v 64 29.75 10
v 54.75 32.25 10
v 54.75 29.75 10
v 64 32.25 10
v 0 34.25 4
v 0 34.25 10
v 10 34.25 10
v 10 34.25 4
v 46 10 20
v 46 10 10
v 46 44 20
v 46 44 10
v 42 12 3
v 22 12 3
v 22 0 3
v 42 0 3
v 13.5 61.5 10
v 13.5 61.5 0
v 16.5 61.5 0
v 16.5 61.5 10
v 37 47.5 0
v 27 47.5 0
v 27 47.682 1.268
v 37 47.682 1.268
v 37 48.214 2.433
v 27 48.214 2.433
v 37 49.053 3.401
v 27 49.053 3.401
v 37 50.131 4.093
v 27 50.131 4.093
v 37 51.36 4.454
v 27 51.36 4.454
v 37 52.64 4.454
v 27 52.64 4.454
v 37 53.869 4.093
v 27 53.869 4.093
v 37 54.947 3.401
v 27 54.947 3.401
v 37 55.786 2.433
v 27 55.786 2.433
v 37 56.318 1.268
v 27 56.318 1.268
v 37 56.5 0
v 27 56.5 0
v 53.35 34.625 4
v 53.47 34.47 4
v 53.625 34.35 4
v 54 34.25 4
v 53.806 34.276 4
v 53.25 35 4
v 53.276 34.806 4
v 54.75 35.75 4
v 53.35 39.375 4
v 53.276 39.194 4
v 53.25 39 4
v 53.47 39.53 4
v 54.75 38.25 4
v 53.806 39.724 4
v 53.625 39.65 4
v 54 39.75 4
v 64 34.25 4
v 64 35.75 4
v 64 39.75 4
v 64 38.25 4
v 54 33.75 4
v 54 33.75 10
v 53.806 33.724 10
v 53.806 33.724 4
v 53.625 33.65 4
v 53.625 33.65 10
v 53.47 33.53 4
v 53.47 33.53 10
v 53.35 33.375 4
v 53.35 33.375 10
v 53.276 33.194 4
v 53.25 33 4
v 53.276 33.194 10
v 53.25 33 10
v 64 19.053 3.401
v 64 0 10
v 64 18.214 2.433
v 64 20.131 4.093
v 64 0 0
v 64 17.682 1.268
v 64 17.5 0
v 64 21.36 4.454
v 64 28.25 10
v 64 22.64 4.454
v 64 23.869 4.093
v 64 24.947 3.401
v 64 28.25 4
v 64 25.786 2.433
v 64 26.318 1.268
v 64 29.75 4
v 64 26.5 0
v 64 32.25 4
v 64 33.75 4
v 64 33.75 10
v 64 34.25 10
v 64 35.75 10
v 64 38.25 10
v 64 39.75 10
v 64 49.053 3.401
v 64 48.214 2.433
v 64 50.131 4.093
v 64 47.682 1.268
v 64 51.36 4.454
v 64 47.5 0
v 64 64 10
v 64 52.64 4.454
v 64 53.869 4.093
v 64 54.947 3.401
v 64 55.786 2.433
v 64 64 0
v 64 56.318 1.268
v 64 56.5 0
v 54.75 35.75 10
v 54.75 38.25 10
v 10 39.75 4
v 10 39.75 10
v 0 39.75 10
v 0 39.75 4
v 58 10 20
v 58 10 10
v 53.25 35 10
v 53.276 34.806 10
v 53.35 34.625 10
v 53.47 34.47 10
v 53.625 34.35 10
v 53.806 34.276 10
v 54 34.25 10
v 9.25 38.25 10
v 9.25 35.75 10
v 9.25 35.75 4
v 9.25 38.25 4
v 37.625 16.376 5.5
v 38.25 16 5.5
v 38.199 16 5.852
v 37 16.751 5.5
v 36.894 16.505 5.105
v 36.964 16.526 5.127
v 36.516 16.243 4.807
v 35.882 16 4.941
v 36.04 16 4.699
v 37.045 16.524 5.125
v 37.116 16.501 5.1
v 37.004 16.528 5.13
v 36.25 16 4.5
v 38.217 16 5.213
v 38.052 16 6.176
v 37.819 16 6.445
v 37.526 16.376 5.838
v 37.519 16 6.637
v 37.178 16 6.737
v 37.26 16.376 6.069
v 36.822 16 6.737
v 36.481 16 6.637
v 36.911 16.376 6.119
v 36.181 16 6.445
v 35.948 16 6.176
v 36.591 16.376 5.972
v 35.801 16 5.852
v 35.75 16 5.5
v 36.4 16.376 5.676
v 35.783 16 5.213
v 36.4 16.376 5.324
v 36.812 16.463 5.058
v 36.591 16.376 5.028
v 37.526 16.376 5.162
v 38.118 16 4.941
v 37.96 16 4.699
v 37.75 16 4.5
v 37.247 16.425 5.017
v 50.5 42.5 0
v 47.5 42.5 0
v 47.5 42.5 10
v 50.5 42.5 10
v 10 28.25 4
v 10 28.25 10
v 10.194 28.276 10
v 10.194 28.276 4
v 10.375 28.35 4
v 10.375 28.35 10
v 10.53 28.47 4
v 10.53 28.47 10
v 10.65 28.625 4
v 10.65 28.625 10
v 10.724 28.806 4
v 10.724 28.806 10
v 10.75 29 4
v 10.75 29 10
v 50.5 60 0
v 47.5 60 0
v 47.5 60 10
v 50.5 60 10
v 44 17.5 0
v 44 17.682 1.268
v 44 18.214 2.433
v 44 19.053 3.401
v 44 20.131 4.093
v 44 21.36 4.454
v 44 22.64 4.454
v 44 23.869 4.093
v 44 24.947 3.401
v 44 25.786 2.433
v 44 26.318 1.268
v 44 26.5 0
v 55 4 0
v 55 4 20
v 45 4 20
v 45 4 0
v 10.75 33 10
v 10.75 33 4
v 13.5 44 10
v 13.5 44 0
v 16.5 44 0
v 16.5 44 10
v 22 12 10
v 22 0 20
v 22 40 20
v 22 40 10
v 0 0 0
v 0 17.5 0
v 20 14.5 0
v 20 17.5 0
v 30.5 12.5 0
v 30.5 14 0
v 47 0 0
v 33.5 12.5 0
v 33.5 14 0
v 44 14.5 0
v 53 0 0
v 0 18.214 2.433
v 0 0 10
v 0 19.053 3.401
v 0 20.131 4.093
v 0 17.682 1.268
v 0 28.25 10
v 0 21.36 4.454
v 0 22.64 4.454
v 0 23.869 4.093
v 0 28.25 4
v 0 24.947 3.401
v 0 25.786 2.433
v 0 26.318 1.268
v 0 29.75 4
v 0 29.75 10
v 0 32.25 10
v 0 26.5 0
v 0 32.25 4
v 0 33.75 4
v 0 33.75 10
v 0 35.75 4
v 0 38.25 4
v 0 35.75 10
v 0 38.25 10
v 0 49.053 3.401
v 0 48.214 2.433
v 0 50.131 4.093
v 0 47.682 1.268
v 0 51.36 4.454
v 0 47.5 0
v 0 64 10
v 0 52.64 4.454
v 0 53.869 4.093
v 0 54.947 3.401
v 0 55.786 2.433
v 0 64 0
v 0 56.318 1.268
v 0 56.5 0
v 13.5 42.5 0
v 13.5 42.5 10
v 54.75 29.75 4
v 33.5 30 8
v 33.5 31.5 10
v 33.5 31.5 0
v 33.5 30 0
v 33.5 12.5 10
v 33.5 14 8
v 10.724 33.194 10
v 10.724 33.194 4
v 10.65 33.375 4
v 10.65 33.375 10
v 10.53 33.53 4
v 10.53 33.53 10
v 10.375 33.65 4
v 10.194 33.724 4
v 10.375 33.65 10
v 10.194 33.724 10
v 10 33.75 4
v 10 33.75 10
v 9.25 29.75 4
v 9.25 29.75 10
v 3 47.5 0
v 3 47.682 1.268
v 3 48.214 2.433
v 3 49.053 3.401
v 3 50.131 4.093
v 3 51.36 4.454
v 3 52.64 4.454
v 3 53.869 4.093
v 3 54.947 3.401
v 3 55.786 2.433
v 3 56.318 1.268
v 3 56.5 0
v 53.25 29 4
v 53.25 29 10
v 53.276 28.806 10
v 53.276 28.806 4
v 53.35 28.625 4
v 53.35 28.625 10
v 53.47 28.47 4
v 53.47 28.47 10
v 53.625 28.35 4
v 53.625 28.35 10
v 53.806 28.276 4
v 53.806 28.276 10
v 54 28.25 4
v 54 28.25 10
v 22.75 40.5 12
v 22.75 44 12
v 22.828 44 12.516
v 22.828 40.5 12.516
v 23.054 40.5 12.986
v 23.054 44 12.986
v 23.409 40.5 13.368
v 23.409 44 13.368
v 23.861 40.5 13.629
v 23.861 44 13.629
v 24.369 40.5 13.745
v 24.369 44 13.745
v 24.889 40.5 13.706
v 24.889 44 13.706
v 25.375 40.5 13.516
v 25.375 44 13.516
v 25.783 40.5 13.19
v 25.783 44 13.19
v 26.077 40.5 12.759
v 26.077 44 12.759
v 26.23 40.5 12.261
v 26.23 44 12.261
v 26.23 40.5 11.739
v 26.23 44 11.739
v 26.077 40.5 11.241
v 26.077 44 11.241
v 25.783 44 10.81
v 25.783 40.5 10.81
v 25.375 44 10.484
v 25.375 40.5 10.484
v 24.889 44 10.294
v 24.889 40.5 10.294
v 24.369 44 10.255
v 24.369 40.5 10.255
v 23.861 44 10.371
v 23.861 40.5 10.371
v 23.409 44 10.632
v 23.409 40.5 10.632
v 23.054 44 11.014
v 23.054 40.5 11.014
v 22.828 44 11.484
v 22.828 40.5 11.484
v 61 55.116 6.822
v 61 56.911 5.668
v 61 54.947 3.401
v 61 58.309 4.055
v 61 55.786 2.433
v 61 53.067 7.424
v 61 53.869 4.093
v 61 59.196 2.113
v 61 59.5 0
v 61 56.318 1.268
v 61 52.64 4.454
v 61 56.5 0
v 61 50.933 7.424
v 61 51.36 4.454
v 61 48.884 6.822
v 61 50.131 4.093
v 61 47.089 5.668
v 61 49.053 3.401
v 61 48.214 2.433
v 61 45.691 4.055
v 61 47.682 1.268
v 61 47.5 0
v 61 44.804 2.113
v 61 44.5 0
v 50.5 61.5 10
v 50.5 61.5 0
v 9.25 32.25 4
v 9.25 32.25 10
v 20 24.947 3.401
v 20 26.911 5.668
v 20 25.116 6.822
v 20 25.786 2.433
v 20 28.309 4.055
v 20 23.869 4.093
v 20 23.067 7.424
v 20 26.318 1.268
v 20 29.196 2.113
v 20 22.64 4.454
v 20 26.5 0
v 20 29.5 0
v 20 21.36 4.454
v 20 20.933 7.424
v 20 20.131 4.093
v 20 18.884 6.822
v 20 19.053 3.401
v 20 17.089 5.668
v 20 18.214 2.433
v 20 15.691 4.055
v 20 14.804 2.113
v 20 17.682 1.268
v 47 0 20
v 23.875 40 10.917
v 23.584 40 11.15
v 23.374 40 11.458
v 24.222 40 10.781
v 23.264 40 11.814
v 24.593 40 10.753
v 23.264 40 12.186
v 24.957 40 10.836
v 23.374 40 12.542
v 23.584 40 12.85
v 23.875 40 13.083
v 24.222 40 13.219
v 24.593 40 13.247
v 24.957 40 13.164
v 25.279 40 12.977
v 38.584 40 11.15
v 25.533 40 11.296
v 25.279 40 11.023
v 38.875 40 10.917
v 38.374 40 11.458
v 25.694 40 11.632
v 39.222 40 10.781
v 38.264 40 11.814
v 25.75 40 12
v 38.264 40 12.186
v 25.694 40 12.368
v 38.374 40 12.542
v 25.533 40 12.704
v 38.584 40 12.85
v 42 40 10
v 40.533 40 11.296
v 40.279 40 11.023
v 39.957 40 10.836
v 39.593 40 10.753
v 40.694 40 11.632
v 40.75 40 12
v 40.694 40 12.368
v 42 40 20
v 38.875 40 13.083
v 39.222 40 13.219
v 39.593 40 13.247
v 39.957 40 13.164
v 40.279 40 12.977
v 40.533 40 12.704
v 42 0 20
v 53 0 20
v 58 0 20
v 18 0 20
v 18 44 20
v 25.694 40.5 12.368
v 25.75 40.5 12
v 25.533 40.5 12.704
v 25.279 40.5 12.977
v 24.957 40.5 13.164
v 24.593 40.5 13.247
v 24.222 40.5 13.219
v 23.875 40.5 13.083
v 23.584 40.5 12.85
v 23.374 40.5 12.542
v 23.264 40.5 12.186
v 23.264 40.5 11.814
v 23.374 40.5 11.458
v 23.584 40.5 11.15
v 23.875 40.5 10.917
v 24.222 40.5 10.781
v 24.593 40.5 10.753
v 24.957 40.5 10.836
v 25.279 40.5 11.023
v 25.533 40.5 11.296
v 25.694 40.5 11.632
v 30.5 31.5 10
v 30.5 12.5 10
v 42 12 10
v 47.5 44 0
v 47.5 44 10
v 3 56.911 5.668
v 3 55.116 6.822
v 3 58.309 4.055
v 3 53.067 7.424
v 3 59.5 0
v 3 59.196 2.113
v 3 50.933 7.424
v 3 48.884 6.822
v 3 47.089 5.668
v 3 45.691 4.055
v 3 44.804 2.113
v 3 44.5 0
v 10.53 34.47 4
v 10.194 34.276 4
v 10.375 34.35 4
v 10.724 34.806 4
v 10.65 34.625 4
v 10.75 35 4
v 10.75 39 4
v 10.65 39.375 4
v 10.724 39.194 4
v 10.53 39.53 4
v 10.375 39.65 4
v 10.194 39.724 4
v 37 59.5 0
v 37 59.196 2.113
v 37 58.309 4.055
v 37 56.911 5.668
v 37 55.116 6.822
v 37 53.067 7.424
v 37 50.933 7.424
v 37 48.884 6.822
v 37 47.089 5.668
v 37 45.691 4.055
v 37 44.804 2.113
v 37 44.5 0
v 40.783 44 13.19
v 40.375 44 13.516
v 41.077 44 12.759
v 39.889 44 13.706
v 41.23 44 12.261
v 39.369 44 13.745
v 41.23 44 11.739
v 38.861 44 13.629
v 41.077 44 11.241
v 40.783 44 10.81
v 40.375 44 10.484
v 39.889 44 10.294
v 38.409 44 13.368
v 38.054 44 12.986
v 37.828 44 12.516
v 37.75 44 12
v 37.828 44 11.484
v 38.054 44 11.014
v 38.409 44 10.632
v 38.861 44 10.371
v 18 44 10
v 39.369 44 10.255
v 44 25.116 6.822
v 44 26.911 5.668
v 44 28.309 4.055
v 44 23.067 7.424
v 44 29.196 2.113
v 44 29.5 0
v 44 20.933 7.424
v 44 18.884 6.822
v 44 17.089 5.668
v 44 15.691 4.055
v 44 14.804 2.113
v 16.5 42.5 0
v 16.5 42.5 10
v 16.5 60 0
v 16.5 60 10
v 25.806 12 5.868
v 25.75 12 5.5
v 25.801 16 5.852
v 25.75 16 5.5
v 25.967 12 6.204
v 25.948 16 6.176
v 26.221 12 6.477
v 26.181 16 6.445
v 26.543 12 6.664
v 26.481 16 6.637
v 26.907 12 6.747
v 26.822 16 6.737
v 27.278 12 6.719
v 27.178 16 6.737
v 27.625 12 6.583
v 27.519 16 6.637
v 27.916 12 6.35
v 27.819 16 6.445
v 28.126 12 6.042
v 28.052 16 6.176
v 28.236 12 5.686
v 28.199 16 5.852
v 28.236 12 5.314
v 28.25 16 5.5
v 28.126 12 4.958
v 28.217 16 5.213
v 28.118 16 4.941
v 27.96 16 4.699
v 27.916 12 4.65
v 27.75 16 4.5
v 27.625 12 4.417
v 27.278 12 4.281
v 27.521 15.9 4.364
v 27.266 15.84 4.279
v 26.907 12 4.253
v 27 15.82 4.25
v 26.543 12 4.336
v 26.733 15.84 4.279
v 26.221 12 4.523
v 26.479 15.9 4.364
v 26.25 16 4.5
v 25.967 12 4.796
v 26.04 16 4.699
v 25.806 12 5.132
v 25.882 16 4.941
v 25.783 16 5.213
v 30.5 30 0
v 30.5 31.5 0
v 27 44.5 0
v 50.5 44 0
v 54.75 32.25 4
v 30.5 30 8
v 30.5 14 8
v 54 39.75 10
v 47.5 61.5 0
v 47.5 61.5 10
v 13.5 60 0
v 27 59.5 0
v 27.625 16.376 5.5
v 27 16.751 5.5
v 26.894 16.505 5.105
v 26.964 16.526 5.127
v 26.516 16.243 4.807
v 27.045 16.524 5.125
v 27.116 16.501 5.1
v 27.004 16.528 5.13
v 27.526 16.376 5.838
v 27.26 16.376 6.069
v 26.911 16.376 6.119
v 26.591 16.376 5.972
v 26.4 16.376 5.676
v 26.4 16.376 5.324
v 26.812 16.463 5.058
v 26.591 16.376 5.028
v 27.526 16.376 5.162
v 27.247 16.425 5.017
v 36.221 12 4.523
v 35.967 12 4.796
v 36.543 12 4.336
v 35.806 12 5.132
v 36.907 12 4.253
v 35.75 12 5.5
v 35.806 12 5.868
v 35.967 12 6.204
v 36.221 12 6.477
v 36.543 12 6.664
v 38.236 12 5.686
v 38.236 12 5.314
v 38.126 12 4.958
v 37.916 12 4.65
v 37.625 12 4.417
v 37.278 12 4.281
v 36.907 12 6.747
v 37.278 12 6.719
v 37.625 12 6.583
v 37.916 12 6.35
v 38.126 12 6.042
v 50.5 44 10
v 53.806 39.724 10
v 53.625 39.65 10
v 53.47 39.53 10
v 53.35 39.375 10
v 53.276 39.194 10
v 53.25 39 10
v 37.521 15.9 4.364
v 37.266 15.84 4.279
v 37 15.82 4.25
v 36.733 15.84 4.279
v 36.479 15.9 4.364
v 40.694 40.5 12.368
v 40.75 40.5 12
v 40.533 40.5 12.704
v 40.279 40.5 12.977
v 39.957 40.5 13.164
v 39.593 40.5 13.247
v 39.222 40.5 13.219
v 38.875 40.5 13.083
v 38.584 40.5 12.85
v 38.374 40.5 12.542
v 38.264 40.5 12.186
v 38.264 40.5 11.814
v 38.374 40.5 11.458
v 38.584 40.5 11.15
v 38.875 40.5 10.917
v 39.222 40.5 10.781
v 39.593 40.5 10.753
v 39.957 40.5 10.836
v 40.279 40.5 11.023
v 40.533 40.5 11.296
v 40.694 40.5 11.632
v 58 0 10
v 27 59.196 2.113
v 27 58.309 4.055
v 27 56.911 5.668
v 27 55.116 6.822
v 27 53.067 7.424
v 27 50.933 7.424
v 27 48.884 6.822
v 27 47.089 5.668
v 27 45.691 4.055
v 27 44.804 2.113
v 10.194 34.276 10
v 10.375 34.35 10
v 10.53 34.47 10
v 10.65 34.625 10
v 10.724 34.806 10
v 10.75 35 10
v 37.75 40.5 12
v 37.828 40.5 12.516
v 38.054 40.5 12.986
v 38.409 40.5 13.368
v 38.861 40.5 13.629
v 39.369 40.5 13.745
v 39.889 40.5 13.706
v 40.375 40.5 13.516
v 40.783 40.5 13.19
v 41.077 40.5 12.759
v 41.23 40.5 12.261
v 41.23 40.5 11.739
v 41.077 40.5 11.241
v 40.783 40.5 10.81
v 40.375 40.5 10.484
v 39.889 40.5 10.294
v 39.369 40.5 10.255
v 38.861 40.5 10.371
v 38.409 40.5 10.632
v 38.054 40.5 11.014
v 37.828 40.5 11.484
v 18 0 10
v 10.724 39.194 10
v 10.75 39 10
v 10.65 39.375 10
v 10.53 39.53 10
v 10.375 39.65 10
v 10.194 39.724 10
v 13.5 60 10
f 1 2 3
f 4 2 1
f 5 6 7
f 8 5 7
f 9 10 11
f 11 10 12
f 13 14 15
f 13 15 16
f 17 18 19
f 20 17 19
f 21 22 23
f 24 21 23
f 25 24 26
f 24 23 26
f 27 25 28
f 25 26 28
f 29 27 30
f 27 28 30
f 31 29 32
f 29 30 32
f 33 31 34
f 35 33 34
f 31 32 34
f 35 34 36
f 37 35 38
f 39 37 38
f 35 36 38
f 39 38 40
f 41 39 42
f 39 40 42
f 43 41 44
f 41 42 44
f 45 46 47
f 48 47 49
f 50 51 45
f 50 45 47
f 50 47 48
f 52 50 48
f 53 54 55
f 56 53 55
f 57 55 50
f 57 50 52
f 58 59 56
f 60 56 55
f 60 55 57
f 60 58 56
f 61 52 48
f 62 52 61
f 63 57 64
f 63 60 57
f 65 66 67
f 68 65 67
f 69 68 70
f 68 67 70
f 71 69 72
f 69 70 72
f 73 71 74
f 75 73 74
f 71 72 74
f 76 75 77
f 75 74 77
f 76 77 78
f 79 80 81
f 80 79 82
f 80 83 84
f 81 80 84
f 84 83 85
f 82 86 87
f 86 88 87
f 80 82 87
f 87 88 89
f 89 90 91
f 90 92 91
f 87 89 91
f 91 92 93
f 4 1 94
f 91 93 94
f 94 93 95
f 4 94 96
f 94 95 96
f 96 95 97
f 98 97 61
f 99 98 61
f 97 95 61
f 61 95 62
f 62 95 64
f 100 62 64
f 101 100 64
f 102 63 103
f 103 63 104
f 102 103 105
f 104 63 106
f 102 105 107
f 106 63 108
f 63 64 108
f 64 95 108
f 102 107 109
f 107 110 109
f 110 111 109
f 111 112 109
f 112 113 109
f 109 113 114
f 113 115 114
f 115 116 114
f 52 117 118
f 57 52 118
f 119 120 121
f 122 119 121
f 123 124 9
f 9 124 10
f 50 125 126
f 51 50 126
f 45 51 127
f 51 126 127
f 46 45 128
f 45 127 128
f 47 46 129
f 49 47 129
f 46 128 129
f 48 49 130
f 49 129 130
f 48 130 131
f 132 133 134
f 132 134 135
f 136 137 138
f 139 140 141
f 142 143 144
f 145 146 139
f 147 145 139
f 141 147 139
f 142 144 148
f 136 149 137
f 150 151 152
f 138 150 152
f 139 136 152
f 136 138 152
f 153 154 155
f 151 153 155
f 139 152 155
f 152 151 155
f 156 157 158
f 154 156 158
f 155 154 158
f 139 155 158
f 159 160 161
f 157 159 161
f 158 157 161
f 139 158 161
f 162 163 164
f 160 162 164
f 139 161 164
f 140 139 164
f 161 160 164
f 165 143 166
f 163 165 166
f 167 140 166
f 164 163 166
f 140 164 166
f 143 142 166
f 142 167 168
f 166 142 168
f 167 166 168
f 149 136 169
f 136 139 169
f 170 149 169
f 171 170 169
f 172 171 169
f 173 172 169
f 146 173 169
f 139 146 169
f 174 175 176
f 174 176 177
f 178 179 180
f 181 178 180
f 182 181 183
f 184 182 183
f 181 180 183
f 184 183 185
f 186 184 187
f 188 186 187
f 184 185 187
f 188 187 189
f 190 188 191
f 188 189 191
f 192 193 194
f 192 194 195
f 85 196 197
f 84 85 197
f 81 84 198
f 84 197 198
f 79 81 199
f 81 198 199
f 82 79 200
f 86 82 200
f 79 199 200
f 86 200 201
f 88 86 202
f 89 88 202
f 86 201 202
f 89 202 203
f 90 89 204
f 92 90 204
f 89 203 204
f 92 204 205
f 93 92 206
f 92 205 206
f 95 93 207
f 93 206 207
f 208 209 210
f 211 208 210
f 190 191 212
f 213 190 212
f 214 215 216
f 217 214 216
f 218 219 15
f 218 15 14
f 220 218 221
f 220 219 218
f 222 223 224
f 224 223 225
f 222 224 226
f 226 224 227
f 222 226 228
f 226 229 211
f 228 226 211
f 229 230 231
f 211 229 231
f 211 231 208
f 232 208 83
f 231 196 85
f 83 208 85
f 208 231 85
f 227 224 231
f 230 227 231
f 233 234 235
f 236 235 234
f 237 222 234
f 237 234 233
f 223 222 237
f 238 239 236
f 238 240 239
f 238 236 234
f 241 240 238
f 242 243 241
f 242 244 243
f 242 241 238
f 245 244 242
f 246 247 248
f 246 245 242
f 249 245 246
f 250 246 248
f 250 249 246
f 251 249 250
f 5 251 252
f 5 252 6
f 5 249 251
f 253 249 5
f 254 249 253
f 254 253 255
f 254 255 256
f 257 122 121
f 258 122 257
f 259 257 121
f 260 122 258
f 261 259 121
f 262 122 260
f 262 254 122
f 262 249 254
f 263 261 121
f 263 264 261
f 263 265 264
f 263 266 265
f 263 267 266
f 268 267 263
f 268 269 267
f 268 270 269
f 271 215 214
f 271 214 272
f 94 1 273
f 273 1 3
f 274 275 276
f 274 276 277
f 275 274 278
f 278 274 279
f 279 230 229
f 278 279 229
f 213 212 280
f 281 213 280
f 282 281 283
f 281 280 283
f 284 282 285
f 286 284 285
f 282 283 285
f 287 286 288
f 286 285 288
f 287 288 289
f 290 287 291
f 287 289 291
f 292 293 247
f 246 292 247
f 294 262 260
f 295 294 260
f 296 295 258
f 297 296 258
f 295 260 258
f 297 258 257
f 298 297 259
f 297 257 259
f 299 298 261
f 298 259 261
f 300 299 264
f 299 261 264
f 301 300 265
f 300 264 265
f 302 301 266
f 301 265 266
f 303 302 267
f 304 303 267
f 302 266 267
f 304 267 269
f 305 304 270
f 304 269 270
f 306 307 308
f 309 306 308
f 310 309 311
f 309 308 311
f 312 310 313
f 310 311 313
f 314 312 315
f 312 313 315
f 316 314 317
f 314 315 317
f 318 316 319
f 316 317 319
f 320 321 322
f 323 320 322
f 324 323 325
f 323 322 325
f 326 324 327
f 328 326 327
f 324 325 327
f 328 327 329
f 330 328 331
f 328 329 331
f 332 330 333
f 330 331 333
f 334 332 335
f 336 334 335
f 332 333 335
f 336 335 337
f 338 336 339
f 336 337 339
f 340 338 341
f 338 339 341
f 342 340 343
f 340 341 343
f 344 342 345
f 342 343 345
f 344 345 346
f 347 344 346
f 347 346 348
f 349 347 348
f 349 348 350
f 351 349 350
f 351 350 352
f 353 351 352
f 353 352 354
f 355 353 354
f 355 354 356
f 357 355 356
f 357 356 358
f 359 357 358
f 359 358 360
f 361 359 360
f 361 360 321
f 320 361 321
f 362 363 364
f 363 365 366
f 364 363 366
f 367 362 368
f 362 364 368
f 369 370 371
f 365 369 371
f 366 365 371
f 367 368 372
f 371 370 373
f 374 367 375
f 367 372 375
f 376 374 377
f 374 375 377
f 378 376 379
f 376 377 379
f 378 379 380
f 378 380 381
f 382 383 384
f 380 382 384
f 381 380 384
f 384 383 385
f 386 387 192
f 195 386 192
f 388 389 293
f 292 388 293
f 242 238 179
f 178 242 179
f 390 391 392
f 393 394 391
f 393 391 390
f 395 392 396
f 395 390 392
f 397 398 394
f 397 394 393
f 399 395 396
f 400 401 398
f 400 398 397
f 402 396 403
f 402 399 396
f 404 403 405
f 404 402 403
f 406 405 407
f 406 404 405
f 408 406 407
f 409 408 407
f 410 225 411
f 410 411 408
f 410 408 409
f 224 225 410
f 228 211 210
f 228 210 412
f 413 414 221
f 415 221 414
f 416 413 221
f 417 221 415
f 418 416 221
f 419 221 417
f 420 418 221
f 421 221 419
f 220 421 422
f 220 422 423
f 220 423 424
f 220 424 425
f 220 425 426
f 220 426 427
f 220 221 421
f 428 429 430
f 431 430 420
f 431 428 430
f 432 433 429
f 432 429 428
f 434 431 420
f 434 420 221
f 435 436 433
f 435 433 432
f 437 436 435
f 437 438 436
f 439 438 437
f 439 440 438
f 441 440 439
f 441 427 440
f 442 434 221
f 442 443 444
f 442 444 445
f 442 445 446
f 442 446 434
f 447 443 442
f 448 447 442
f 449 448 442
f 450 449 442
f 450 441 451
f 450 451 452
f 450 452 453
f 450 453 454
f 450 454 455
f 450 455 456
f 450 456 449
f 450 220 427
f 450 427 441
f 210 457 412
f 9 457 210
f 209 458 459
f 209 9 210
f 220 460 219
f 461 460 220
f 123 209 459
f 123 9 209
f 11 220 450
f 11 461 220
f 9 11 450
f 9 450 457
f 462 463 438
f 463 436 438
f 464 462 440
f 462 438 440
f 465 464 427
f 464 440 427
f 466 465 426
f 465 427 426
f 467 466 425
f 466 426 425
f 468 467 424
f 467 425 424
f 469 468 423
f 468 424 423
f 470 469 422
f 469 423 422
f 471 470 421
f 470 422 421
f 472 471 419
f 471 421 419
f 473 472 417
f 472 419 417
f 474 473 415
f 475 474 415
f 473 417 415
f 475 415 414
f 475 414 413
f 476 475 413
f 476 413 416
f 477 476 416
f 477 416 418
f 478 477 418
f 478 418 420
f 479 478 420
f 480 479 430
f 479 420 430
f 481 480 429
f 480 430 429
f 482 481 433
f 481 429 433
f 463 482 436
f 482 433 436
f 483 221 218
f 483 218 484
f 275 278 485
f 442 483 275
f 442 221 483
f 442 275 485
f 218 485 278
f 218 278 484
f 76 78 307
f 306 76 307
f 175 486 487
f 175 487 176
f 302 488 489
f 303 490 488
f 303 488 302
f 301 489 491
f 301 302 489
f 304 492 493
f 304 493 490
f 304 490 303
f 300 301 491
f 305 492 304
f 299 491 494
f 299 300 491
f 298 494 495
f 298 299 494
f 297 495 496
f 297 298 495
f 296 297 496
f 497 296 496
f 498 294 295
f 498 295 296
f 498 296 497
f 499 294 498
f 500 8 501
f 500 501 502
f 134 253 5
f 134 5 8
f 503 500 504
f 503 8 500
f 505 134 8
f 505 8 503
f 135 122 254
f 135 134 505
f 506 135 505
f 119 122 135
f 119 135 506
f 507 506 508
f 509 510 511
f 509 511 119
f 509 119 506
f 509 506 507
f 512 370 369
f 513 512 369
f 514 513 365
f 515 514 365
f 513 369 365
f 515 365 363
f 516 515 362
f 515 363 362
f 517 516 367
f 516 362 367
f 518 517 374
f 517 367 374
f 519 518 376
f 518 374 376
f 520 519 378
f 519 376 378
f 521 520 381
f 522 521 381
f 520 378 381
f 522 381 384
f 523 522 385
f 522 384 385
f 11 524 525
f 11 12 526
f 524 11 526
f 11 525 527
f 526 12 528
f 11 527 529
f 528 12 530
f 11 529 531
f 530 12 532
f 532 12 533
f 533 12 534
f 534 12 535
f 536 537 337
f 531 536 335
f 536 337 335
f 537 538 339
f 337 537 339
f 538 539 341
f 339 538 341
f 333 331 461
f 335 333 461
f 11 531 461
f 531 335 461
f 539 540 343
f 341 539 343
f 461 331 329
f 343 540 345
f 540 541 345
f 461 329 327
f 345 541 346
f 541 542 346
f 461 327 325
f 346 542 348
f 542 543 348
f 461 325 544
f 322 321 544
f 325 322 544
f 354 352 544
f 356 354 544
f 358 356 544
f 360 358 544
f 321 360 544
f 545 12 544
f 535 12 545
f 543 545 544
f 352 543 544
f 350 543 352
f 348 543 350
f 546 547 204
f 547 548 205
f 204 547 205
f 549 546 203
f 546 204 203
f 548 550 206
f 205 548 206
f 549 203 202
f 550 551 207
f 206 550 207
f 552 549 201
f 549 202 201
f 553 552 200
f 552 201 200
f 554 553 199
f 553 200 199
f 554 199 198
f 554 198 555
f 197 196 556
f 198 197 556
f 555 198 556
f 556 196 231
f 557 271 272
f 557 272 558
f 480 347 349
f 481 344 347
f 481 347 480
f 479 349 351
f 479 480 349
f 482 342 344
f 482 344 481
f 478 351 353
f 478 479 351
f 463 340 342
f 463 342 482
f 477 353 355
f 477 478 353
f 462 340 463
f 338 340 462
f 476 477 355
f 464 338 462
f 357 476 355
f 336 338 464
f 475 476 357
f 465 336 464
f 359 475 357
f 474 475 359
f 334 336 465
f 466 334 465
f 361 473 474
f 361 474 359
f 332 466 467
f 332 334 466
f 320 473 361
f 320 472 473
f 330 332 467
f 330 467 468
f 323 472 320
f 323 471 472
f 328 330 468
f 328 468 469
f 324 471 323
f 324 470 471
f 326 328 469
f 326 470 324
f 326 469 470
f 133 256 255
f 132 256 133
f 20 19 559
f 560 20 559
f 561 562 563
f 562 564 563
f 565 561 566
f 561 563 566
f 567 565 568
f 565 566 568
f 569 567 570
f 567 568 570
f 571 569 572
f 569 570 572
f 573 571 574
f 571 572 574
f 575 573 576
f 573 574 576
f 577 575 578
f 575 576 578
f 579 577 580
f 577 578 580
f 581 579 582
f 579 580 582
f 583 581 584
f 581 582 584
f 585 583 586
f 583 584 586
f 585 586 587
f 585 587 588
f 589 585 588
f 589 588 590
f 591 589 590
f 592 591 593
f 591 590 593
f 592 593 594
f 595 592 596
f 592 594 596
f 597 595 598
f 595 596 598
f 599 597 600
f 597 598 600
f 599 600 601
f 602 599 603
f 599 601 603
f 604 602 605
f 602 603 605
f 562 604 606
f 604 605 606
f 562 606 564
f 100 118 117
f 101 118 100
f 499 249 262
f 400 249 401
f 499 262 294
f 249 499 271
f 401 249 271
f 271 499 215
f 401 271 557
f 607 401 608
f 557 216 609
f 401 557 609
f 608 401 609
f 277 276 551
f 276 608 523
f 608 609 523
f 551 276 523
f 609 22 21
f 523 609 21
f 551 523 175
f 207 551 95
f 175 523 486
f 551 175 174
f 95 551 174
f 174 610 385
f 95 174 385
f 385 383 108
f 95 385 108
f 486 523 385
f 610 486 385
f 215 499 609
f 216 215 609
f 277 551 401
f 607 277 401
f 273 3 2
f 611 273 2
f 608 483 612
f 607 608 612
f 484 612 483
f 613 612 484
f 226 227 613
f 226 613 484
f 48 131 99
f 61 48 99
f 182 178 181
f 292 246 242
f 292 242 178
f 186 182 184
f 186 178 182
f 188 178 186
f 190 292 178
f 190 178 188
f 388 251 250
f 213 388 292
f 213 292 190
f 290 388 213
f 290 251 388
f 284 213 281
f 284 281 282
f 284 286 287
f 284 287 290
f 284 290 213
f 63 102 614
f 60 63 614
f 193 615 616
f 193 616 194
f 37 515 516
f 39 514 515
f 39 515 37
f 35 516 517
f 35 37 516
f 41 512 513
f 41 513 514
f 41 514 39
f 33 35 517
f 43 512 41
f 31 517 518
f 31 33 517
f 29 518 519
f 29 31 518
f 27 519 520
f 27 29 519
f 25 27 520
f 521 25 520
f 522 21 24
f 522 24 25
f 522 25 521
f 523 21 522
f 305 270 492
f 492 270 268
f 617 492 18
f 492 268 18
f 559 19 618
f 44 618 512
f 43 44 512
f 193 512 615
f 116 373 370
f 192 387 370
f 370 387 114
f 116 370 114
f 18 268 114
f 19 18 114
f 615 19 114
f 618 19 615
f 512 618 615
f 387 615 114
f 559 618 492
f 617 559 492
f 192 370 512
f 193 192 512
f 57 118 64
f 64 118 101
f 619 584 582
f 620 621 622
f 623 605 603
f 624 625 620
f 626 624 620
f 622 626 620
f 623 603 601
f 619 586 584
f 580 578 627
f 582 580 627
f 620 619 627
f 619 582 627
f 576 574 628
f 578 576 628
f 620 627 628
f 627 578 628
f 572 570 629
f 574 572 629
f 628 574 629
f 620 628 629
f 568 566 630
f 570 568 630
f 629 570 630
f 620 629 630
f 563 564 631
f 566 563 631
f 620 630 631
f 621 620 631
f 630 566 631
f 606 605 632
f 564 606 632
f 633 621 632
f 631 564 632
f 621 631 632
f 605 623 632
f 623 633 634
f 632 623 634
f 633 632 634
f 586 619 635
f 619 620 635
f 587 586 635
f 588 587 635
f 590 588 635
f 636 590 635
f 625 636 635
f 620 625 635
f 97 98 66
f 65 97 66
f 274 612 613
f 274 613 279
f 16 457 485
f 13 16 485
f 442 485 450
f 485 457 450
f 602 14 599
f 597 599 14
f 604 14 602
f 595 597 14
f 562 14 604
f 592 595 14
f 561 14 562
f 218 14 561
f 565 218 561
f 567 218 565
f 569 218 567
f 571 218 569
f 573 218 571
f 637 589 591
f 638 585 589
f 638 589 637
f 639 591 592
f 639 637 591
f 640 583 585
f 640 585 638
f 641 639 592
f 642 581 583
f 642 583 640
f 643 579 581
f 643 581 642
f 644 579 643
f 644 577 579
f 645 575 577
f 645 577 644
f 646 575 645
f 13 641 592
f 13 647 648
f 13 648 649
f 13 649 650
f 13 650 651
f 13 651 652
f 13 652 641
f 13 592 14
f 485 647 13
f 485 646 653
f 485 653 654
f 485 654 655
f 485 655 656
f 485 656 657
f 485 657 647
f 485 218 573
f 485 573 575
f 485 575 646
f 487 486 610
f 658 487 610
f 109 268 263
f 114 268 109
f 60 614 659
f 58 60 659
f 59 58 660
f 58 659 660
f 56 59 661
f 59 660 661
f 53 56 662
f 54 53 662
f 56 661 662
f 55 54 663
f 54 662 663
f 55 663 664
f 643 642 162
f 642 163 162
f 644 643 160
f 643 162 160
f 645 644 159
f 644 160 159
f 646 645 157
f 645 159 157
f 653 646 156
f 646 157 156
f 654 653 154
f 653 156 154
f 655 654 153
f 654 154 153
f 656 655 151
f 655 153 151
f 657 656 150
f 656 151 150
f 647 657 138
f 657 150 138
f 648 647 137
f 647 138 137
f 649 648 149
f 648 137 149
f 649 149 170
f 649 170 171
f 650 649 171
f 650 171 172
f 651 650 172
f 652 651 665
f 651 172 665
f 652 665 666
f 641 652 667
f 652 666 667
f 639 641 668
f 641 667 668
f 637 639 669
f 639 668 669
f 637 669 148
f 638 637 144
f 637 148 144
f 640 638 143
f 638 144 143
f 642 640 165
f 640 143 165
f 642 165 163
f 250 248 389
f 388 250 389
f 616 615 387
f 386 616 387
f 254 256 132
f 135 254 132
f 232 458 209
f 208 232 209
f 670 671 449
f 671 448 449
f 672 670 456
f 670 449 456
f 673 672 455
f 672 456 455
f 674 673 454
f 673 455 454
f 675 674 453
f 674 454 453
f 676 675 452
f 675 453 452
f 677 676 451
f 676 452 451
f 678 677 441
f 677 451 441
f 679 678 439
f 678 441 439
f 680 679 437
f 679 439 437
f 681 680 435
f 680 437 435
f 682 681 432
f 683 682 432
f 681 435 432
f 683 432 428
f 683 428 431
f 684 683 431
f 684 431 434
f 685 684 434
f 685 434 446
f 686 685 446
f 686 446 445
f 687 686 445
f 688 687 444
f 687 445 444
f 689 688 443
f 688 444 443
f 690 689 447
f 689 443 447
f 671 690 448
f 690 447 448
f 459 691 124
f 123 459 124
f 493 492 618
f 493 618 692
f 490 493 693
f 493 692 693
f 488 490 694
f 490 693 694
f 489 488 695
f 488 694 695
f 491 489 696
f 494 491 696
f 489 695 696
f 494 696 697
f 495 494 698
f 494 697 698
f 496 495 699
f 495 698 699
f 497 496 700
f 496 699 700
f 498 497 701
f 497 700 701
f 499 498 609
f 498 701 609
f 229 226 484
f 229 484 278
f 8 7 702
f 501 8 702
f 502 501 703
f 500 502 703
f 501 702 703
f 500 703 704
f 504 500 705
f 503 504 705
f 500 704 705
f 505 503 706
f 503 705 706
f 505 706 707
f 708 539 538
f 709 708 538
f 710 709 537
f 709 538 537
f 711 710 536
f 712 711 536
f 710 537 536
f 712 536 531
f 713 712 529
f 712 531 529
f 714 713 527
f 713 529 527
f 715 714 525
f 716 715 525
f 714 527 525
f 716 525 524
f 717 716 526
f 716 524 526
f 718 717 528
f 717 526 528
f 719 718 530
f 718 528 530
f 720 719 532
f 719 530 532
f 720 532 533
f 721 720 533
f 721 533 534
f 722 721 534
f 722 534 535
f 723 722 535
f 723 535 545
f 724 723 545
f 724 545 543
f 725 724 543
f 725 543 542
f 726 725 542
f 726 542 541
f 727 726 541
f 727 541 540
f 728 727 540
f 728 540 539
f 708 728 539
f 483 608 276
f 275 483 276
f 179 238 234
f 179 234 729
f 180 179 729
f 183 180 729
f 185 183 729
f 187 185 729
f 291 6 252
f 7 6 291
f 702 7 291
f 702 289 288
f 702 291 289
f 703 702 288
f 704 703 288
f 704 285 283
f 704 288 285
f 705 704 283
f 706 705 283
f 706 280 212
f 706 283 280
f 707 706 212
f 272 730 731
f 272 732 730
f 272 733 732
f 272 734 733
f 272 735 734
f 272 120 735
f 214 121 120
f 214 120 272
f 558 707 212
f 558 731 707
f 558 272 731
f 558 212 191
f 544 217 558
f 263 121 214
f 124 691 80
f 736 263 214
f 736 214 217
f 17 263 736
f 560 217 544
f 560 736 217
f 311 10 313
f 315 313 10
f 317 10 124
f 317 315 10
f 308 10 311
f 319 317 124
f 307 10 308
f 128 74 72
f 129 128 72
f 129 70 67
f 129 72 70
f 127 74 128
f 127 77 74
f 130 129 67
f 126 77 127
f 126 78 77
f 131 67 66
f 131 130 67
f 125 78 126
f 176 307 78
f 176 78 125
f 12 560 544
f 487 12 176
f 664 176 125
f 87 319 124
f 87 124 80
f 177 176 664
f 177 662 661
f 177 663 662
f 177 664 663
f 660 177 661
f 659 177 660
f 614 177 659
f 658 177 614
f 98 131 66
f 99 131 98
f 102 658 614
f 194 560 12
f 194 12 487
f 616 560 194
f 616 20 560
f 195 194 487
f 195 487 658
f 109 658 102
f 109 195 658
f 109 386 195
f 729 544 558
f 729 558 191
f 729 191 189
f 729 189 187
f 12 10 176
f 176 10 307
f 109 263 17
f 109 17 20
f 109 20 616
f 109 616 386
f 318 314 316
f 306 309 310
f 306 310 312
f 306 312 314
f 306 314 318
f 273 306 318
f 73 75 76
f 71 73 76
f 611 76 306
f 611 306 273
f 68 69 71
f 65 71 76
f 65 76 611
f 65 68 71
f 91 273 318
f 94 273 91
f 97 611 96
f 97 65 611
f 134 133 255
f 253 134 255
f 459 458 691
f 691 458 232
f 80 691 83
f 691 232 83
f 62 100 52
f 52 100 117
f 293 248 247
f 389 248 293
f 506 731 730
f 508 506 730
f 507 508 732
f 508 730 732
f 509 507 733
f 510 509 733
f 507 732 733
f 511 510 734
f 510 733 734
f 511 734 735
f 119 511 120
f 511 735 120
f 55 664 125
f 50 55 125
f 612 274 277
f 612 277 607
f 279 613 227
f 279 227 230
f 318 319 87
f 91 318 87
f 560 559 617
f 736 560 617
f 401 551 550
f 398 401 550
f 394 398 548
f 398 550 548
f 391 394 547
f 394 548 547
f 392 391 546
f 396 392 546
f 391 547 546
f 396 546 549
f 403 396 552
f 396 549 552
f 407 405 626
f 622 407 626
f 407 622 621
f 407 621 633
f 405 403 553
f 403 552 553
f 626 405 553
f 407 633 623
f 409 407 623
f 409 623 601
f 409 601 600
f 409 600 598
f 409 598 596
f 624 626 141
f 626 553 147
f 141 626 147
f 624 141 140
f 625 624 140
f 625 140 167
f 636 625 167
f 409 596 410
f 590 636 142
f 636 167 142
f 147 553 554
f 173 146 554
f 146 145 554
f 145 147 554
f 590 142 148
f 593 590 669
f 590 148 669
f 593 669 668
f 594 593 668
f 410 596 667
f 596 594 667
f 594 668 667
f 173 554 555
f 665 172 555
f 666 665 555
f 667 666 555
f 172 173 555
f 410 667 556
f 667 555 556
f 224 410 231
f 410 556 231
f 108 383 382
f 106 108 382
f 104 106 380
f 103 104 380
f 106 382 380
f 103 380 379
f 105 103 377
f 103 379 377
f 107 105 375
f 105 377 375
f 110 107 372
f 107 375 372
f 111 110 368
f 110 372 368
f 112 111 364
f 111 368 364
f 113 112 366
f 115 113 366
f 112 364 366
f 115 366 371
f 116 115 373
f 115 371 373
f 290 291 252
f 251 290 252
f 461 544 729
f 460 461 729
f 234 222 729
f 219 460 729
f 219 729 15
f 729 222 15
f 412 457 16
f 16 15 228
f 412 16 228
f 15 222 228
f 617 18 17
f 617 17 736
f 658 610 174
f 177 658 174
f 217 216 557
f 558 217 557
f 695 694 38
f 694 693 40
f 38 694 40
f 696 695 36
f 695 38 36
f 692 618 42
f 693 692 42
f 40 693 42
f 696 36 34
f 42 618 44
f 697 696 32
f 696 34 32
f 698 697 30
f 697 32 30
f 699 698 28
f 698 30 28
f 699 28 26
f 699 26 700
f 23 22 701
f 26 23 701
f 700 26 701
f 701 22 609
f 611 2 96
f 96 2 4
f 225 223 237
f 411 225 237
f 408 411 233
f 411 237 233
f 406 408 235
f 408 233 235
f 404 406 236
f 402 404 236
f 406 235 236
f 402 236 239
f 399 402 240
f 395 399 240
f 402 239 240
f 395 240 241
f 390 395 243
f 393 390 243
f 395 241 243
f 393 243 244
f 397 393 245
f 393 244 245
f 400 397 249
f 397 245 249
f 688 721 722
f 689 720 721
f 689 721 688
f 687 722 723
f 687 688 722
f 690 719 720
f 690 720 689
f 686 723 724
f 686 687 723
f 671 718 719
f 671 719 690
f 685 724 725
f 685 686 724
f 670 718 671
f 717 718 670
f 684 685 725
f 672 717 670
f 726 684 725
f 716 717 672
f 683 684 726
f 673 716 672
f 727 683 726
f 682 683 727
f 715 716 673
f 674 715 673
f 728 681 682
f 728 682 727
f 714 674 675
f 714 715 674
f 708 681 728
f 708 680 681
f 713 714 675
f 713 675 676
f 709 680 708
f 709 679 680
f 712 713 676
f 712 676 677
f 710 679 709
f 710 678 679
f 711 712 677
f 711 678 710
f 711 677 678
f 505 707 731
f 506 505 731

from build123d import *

# Parameters (mm, degrees)
F0_W            = 64
F0_H            = 64
F1_DEPTH        = 10
F3_DEPTH        = 64.001
F4_W            = 20
F4_H            = 34.5
F5_W            = 3
F5_H            = 26.7061145455
F5_W_2          = 10
F6_DEPTH        = 7.6
F7_R            = 4.5
F8_DEPTH        = 64.001
F10_DEPTH       = 10
F11_W           = 20
F11_H           = 40
F12_DEPTH       = 10
F13_W           = 20
F13_H           = 12
F14_DEPTH       = 7
F16_DEPTH       = 20.001
F18_D           = 2.5
F18_DEPTH       = 4
F18_TIP         = 0.7510757738
F20_D           = 2.5
F20_DEPTH       = 4
F20_CBORE_D     = 3.5
F20_CBORE_DEPTH = 3.5
F20_TIP         = 0.7510757738
F21_W           = 0.75
F21_H           = 0.25
F21_H_2         = 2.25
F21_H_3         = 0.75
F21_H_4         = 2.5
F22_DEPTH       = 6
F23_W           = 3
F23_H           = 1.5
F23_W_2         = 1.5
F24_DEPTH       = 10
F25_W           = 3
F25_H           = 16
F26_DEPTH       = 2


with BuildPart() as f1:
    # F0 (on Top) → F1 (new body)
    with BuildSketch(Plane.XY):
        with Locations((32, 32)):
            Rectangle(F0_W, F0_H)
    extrude(amount=F1_DEPTH)

    # F2 (on face) → F3 (cut, through all)
    with BuildSketch(Plane.YZ.offset(64)):
        with BuildLine():
            Line((14.5, 0), (29.5, 0))
            ThreePointArc((29.5, 0), (22, 7.5), (14.5, 0))
        make_face()
        with BuildLine():
            ThreePointArc((59.5, 0), (52, 7.5), (44.5, 0))
            Line((44.5, 0), (59.5, 0))
        make_face()
    extrude(amount=-F3_DEPTH, mode=Mode.SUBTRACT)

    # F4 (on face) + F5 (on face) → F6 (join)
    with BuildSketch(Plane(origin=(0, 0, 0), x_dir=(1, 0, 0), z_dir=(0, 0, -1))):
        with Locations((10, -17.25)):
            Rectangle(F4_W, F4_H)
        with Locations((54, -17.25)):
            Rectangle(F4_W, F4_H)
    with BuildSketch(Plane(origin=(0, 0, 0), x_dir=(1, 0, 0), z_dir=(0, 0, -1))):
        with Locations((1.5, -50.6469427273)):
            Rectangle(F5_W, F5_H)
        with Locations((32, -50.6469427273)):
            Rectangle(F5_W_2, F5_H)
        with Locations((62.5, -50.6469427273)):
            Rectangle(F5_W, F5_H)
    extrude(amount=-F6_DEPTH)

    # F7 (on face) → F8 (cut, through all)
    with BuildSketch(Plane(origin=(0, 0, 0), x_dir=(0, -1, 0), z_dir=(-1, 0, 0))):
        with Locations((-52, 0)):
            Circle(F7_R)
        with Locations((-22, 0)):
            Circle(F7_R)
    extrude(amount=-F8_DEPTH, mode=Mode.SUBTRACT)

    # F9 (on face) → F10 (join)
    with BuildSketch(Plane.XY.offset(10)):
        Polygon((18, 44), (18, 0), (58, 0), (58, 10), (46, 10), (46, 44), align=None)
    extrude(amount=F10_DEPTH)

    # F11 (on face) → F12 (cut)
    with BuildSketch(Plane.XY.offset(20)):
        with Locations((32, 20)):
            Rectangle(F11_W, F11_H)
    extrude(amount=-F12_DEPTH, mode=Mode.SUBTRACT)

    # F13 (on face) → F14 (cut)
    with BuildSketch(Plane.XY.offset(10)):
        with Locations((32, 6)):
            Rectangle(F13_W, F13_H)
    extrude(amount=-F14_DEPTH, mode=Mode.SUBTRACT)

    # F15 (on face) → F16 (cut, through all)
    with BuildSketch(Plane.XY.offset(20)):
        Polygon((47, 0), (50, 0), (50, 4), (45, 4), align=None)
        Polygon((50, 4), (50, 0), (53, 0), (55, 4), align=None)
    extrude(amount=-F16_DEPTH, mode=Mode.SUBTRACT)

    # F18
    with Locations(Plane.XZ.offset(-12)):
        with Locations((27, 5.5), (37, 5.5)):
            Hole(F18_D / 2, depth=F18_DEPTH)
            with Locations((0, 0, -(F18_DEPTH + F18_TIP / 2))):  # 118° drill point
                Cone(0, F18_D / 2, F18_TIP, mode=Mode.SUBTRACT)

    # F20
    with Locations(Plane(origin=(0, 44, 0), x_dir=(-1, 0, 0), z_dir=(0, 1, 0))):
        with Locations((-39.5, 12), (-24.5, 12)):
            CounterBoreHole(F20_D / 2, F20_CBORE_D / 2, F20_CBORE_DEPTH, depth=F20_DEPTH)
            with Locations((0, 0, -(F20_DEPTH + F20_TIP / 2))):  # 118° drill point
                Cone(0, F20_D / 2, F20_TIP, mode=Mode.SUBTRACT)

    # F21 (on face) → F22 (cut)
    with BuildSketch(Plane.XY.offset(10)):
        with Locations((9.625, 32.125)):
            Rectangle(F21_W, F21_H)
        with BuildLine():
            Line((53.25, 33), (53.25, 32))
            Line((53.25, 32), (54, 32))
            Line((54, 32), (54, 32.25))
            ThreePointArc((54, 32.25), (53.4696699141, 32.4696699141), (53.25, 33))
        make_face()
        with BuildLine():
            Line((54, 32), (53.25, 32))
            Line((53.25, 32), (53.25, 29))
            ThreePointArc((53.25, 29), (53.4696699141, 29.5303300859), (54, 29.75))
            Line((54, 29.75), (54, 32))
        make_face()
        with Locations((9.625, 30.875)):
            Rectangle(F21_W, F21_H_2)
        with BuildLine():
            Line((10, 32.25), (10, 32))
            Line((10, 32), (10.75, 32))
            Line((10.75, 32), (10.75, 33))
            ThreePointArc((10.75, 33), (10.5303300859, 32.4696699141), (10, 32.25))
        make_face()
        with BuildLine():
            Line((10.75, 32), (10, 32))
            Line((10, 32), (10, 29.75))
            ThreePointArc((10, 29.75), (10.5303300859, 29.5303300859), (10.75, 29))
            Line((10.75, 29), (10.75, 32))
        make_face()
        with BuildLine():
            Line((0, 32.25), (9.25, 32.25))
            Line((9.25, 32.25), (9.25, 33))
            ThreePointArc((9.25, 33), (9.4696699141, 33.5303300859), (10, 33.75))
            Line((10, 33.75), (0, 33.75))
            ThreePointArc((0, 33.75), (-0.75, 33), (0, 32.25))
        make_face()
        with Locations((9.625, 32.625)):
            Rectangle(F21_W, F21_H_3)
        with Locations((9.625, 29.375)):
            Rectangle(F21_W, F21_H_3)
        with BuildLine():
            Line((9.25, 29), (9.25, 29.75))
            Line((9.25, 29.75), (0, 29.75))
            ThreePointArc((0, 29.75), (-0.75, 29), (0, 28.25))
            Line((0, 28.25), (10, 28.25))
            ThreePointArc((10, 28.25), (9.4696699141, 28.4696699141), (9.25, 29))
        make_face()
        with BuildLine():
            Line((10, 33), (10, 32.25))
            ThreePointArc((10, 32.25), (10.5303300859, 32.4696699141), (10.75, 33))
            ThreePointArc((10.75, 33), (10.5303300859, 33.5303300859), (10, 33.75))
            ThreePointArc((10, 33.75), (9.4696699141, 33.5303300859), (9.25, 33))
            Line((9.25, 33), (10, 33))
        make_face()
        with BuildLine():
            ThreePointArc((10.75, 29), (10.5303300859, 29.5303300859), (10, 29.75))
            Line((10, 29.75), (10, 29))
            Line((10, 29), (9.25, 29))
            ThreePointArc((9.25, 29), (9.4696699141, 28.4696699141), (10, 28.25))
            ThreePointArc((10, 28.25), (10.5303300859, 28.4696699141), (10.75, 29))
        make_face()
        with Locations((54.375, 32.125)):
            Rectangle(F21_W, F21_H)
        with Locations((54.375, 30.875)):
            Rectangle(F21_W, F21_H_2)
        with BuildLine():
            ThreePointArc((54, 33.75), (53.4696699141, 33.5303300859), (53.25, 33))
            ThreePointArc((53.25, 33), (53.4696699141, 32.4696699141), (54, 32.25))
            Line((54, 32.25), (54, 33))
            Line((54, 33), (54.75, 33))
            ThreePointArc((54.75, 33), (54.5303300859, 33.5303300859), (54, 33.75))
        make_face()
        with BuildLine():
            ThreePointArc((54, 29.75), (53.4696699141, 29.5303300859), (53.25, 29))
            ThreePointArc((53.25, 29), (53.4696699141, 28.4696699141), (54, 28.25))
            ThreePointArc((54, 28.25), (54.5303300859, 28.4696699141), (54.75, 29))
            Line((54.75, 29), (54, 29))
            Line((54, 29), (54, 29.75))
        make_face()
        with Locations((54.375, 32.625)):
            Rectangle(F21_W, F21_H_3)
        with Locations((54.375, 29.375)):
            Rectangle(F21_W, F21_H_3)
        with BuildLine():
            Line((64, 33.75), (54, 33.75))
            ThreePointArc((54, 33.75), (54.5303300859, 33.5303300859), (54.75, 33))
            Line((54.75, 33), (54.75, 32.25))
            Line((54.75, 32.25), (64, 32.25))
            ThreePointArc((64, 32.25), (64.75, 33), (64, 33.75))
        make_face()
        with BuildLine():
            ThreePointArc((54.75, 29), (54.5303300859, 28.4696699141), (54, 28.25))
            Line((54, 28.25), (64, 28.25))
            ThreePointArc((64, 28.25), (64.75, 29), (64, 29.75))
            Line((64, 29.75), (54.75, 29.75))
            Line((54.75, 29.75), (54.75, 29))
        make_face()
        with BuildLine():
            ThreePointArc((10, 39.75), (9.4696699141, 39.5303300859), (9.25, 39))
            Line((9.25, 39), (10, 39))
            Line((10, 39), (10, 38.25))
            ThreePointArc((10, 38.25), (10.5303300859, 38.4696699141), (10.75, 39))
            ThreePointArc((10.75, 39), (10.5303300859, 39.5303300859), (10, 39.75))
        make_face()
        with BuildLine():
            Line((9.25, 38.25), (9.25, 39))
            ThreePointArc((9.25, 39), (9.4696699141, 39.5303300859), (10, 39.75))
            Line((10, 39.75), (0, 39.75))
            ThreePointArc((0, 39.75), (-0.75, 39), (0, 38.25))
            Line((0, 38.25), (9.25, 38.25))
        make_face()
        with Locations((9.625, 38.625)):
            Rectangle(F21_W, F21_H_3)
        with Locations((9.625, 37)):
            Rectangle(F21_W, F21_H_4)
        with BuildLine():
            ThreePointArc((10.75, 39), (10.5303300859, 38.4696699141), (10, 38.25))
            Line((10, 38.25), (10, 35.75))
            ThreePointArc((10, 35.75), (10.5303300859, 35.5303300859), (10.75, 35))
            Line((10.75, 35), (10.75, 39))
        make_face()
        with BuildLine():
            Line((9.25, 35), (9.25, 35.75))
            Line((9.25, 35.75), (0, 35.75))
            ThreePointArc((0, 35.75), (-0.75, 35), (0, 34.25))
            Line((0, 34.25), (10, 34.25))
            ThreePointArc((10, 34.25), (9.4696699141, 34.4696699141), (9.25, 35))
        make_face()
        with Locations((9.625, 35.375)):
            Rectangle(F21_W, F21_H_3)
        with BuildLine():
            ThreePointArc((10.75, 35), (10.5303300859, 35.5303300859), (10, 35.75))
            Line((10, 35.75), (10, 35))
            Line((10, 35), (9.25, 35))
            ThreePointArc((9.25, 35), (9.4696699141, 34.4696699141), (10, 34.25))
            ThreePointArc((10, 34.25), (10.5303300859, 34.4696699141), (10.75, 35))
        make_face()
        with Locations((54.375, 35.375)):
            Rectangle(F21_W, F21_H_3)
        with BuildLine():
            Line((54.75, 35), (54, 35))
            Line((54, 35), (54, 35.75))
            ThreePointArc((54, 35.75), (53.4696699141, 35.5303300859), (53.25, 35))
            ThreePointArc((53.25, 35), (53.4696699141, 34.4696699141), (54, 34.25))
            ThreePointArc((54, 34.25), (54.5303300859, 34.4696699141), (54.75, 35))
        make_face()
        with BuildLine():
            Line((54.75, 35.75), (54.75, 35))
            ThreePointArc((54.75, 35), (54.5303300859, 34.4696699141), (54, 34.25))
            Line((54, 34.25), (64, 34.25))
            ThreePointArc((64, 34.25), (64.75, 35), (64, 35.75))
            Line((64, 35.75), (54.75, 35.75))
        make_face()
        with BuildLine():
            ThreePointArc((53.25, 35), (53.4696699141, 35.5303300859), (54, 35.75))
            Line((54, 35.75), (54, 38.25))
            ThreePointArc((54, 38.25), (53.4696699141, 38.4696699141), (53.25, 39))
            Line((53.25, 39), (53.25, 35))
        make_face()
        with Locations((54.375, 37)):
            Rectangle(F21_W, F21_H_4)
        with BuildLine():
            ThreePointArc((53.25, 39), (53.4696699141, 38.4696699141), (54, 38.25))
            Line((54, 38.25), (54, 39))
            Line((54, 39), (54.75, 39))
            ThreePointArc((54.75, 39), (54.5303300859, 39.5303300859), (54, 39.75))
            ThreePointArc((54, 39.75), (53.4696699141, 39.5303300859), (53.25, 39))
        make_face()
        with Locations((54.375, 38.625)):
            Rectangle(F21_W, F21_H_3)
        with BuildLine():
            Line((54.75, 39), (54.75, 38.25))
            Line((54.75, 38.25), (64, 38.25))
            ThreePointArc((64, 38.25), (64.75, 39), (64, 39.75))
            Line((64, 39.75), (54, 39.75))
            ThreePointArc((54, 39.75), (54.5303300859, 39.5303300859), (54.75, 39))
        make_face()
    extrude(amount=-F22_DEPTH, mode=Mode.SUBTRACT)

    # F23 (on face) → F24 (cut, through all)
    with BuildSketch(Plane(origin=(0, 0, 0), x_dir=(1, 0, 0), z_dir=(0, 0, -1))):
        with Locations((49, -43.25)):
            Rectangle(F23_W, F23_H)
        with Locations((49, -60.75)):
            Rectangle(F23_W, F23_H)
        with Locations((14.25, -60.75)):
            Rectangle(F23_W_2, F23_H)
        with Locations((15.75, -60.75)):
            Rectangle(F23_W_2, F23_H)
        with Locations((15, -43.25)):
            Rectangle(F23_W, F23_H)
        with Locations((32.75, -30.75)):
            Rectangle(F23_W_2, F23_H)
        with Locations((31.25, -30.75)):
            Rectangle(F23_W_2, F23_H)
        with Locations((32, -13.25)):
            Rectangle(F23_W, F23_H)
    extrude(amount=-F24_DEPTH, mode=Mode.SUBTRACT)

    # F25 (on face) → F26 (cut)
    with BuildSketch(Plane.XY.offset(10)):
        with Locations((32, 22)):
            Rectangle(F25_W, F25_H)
    extrude(amount=-F26_DEPTH, mode=Mode.SUBTRACT)


solid = f1.part
